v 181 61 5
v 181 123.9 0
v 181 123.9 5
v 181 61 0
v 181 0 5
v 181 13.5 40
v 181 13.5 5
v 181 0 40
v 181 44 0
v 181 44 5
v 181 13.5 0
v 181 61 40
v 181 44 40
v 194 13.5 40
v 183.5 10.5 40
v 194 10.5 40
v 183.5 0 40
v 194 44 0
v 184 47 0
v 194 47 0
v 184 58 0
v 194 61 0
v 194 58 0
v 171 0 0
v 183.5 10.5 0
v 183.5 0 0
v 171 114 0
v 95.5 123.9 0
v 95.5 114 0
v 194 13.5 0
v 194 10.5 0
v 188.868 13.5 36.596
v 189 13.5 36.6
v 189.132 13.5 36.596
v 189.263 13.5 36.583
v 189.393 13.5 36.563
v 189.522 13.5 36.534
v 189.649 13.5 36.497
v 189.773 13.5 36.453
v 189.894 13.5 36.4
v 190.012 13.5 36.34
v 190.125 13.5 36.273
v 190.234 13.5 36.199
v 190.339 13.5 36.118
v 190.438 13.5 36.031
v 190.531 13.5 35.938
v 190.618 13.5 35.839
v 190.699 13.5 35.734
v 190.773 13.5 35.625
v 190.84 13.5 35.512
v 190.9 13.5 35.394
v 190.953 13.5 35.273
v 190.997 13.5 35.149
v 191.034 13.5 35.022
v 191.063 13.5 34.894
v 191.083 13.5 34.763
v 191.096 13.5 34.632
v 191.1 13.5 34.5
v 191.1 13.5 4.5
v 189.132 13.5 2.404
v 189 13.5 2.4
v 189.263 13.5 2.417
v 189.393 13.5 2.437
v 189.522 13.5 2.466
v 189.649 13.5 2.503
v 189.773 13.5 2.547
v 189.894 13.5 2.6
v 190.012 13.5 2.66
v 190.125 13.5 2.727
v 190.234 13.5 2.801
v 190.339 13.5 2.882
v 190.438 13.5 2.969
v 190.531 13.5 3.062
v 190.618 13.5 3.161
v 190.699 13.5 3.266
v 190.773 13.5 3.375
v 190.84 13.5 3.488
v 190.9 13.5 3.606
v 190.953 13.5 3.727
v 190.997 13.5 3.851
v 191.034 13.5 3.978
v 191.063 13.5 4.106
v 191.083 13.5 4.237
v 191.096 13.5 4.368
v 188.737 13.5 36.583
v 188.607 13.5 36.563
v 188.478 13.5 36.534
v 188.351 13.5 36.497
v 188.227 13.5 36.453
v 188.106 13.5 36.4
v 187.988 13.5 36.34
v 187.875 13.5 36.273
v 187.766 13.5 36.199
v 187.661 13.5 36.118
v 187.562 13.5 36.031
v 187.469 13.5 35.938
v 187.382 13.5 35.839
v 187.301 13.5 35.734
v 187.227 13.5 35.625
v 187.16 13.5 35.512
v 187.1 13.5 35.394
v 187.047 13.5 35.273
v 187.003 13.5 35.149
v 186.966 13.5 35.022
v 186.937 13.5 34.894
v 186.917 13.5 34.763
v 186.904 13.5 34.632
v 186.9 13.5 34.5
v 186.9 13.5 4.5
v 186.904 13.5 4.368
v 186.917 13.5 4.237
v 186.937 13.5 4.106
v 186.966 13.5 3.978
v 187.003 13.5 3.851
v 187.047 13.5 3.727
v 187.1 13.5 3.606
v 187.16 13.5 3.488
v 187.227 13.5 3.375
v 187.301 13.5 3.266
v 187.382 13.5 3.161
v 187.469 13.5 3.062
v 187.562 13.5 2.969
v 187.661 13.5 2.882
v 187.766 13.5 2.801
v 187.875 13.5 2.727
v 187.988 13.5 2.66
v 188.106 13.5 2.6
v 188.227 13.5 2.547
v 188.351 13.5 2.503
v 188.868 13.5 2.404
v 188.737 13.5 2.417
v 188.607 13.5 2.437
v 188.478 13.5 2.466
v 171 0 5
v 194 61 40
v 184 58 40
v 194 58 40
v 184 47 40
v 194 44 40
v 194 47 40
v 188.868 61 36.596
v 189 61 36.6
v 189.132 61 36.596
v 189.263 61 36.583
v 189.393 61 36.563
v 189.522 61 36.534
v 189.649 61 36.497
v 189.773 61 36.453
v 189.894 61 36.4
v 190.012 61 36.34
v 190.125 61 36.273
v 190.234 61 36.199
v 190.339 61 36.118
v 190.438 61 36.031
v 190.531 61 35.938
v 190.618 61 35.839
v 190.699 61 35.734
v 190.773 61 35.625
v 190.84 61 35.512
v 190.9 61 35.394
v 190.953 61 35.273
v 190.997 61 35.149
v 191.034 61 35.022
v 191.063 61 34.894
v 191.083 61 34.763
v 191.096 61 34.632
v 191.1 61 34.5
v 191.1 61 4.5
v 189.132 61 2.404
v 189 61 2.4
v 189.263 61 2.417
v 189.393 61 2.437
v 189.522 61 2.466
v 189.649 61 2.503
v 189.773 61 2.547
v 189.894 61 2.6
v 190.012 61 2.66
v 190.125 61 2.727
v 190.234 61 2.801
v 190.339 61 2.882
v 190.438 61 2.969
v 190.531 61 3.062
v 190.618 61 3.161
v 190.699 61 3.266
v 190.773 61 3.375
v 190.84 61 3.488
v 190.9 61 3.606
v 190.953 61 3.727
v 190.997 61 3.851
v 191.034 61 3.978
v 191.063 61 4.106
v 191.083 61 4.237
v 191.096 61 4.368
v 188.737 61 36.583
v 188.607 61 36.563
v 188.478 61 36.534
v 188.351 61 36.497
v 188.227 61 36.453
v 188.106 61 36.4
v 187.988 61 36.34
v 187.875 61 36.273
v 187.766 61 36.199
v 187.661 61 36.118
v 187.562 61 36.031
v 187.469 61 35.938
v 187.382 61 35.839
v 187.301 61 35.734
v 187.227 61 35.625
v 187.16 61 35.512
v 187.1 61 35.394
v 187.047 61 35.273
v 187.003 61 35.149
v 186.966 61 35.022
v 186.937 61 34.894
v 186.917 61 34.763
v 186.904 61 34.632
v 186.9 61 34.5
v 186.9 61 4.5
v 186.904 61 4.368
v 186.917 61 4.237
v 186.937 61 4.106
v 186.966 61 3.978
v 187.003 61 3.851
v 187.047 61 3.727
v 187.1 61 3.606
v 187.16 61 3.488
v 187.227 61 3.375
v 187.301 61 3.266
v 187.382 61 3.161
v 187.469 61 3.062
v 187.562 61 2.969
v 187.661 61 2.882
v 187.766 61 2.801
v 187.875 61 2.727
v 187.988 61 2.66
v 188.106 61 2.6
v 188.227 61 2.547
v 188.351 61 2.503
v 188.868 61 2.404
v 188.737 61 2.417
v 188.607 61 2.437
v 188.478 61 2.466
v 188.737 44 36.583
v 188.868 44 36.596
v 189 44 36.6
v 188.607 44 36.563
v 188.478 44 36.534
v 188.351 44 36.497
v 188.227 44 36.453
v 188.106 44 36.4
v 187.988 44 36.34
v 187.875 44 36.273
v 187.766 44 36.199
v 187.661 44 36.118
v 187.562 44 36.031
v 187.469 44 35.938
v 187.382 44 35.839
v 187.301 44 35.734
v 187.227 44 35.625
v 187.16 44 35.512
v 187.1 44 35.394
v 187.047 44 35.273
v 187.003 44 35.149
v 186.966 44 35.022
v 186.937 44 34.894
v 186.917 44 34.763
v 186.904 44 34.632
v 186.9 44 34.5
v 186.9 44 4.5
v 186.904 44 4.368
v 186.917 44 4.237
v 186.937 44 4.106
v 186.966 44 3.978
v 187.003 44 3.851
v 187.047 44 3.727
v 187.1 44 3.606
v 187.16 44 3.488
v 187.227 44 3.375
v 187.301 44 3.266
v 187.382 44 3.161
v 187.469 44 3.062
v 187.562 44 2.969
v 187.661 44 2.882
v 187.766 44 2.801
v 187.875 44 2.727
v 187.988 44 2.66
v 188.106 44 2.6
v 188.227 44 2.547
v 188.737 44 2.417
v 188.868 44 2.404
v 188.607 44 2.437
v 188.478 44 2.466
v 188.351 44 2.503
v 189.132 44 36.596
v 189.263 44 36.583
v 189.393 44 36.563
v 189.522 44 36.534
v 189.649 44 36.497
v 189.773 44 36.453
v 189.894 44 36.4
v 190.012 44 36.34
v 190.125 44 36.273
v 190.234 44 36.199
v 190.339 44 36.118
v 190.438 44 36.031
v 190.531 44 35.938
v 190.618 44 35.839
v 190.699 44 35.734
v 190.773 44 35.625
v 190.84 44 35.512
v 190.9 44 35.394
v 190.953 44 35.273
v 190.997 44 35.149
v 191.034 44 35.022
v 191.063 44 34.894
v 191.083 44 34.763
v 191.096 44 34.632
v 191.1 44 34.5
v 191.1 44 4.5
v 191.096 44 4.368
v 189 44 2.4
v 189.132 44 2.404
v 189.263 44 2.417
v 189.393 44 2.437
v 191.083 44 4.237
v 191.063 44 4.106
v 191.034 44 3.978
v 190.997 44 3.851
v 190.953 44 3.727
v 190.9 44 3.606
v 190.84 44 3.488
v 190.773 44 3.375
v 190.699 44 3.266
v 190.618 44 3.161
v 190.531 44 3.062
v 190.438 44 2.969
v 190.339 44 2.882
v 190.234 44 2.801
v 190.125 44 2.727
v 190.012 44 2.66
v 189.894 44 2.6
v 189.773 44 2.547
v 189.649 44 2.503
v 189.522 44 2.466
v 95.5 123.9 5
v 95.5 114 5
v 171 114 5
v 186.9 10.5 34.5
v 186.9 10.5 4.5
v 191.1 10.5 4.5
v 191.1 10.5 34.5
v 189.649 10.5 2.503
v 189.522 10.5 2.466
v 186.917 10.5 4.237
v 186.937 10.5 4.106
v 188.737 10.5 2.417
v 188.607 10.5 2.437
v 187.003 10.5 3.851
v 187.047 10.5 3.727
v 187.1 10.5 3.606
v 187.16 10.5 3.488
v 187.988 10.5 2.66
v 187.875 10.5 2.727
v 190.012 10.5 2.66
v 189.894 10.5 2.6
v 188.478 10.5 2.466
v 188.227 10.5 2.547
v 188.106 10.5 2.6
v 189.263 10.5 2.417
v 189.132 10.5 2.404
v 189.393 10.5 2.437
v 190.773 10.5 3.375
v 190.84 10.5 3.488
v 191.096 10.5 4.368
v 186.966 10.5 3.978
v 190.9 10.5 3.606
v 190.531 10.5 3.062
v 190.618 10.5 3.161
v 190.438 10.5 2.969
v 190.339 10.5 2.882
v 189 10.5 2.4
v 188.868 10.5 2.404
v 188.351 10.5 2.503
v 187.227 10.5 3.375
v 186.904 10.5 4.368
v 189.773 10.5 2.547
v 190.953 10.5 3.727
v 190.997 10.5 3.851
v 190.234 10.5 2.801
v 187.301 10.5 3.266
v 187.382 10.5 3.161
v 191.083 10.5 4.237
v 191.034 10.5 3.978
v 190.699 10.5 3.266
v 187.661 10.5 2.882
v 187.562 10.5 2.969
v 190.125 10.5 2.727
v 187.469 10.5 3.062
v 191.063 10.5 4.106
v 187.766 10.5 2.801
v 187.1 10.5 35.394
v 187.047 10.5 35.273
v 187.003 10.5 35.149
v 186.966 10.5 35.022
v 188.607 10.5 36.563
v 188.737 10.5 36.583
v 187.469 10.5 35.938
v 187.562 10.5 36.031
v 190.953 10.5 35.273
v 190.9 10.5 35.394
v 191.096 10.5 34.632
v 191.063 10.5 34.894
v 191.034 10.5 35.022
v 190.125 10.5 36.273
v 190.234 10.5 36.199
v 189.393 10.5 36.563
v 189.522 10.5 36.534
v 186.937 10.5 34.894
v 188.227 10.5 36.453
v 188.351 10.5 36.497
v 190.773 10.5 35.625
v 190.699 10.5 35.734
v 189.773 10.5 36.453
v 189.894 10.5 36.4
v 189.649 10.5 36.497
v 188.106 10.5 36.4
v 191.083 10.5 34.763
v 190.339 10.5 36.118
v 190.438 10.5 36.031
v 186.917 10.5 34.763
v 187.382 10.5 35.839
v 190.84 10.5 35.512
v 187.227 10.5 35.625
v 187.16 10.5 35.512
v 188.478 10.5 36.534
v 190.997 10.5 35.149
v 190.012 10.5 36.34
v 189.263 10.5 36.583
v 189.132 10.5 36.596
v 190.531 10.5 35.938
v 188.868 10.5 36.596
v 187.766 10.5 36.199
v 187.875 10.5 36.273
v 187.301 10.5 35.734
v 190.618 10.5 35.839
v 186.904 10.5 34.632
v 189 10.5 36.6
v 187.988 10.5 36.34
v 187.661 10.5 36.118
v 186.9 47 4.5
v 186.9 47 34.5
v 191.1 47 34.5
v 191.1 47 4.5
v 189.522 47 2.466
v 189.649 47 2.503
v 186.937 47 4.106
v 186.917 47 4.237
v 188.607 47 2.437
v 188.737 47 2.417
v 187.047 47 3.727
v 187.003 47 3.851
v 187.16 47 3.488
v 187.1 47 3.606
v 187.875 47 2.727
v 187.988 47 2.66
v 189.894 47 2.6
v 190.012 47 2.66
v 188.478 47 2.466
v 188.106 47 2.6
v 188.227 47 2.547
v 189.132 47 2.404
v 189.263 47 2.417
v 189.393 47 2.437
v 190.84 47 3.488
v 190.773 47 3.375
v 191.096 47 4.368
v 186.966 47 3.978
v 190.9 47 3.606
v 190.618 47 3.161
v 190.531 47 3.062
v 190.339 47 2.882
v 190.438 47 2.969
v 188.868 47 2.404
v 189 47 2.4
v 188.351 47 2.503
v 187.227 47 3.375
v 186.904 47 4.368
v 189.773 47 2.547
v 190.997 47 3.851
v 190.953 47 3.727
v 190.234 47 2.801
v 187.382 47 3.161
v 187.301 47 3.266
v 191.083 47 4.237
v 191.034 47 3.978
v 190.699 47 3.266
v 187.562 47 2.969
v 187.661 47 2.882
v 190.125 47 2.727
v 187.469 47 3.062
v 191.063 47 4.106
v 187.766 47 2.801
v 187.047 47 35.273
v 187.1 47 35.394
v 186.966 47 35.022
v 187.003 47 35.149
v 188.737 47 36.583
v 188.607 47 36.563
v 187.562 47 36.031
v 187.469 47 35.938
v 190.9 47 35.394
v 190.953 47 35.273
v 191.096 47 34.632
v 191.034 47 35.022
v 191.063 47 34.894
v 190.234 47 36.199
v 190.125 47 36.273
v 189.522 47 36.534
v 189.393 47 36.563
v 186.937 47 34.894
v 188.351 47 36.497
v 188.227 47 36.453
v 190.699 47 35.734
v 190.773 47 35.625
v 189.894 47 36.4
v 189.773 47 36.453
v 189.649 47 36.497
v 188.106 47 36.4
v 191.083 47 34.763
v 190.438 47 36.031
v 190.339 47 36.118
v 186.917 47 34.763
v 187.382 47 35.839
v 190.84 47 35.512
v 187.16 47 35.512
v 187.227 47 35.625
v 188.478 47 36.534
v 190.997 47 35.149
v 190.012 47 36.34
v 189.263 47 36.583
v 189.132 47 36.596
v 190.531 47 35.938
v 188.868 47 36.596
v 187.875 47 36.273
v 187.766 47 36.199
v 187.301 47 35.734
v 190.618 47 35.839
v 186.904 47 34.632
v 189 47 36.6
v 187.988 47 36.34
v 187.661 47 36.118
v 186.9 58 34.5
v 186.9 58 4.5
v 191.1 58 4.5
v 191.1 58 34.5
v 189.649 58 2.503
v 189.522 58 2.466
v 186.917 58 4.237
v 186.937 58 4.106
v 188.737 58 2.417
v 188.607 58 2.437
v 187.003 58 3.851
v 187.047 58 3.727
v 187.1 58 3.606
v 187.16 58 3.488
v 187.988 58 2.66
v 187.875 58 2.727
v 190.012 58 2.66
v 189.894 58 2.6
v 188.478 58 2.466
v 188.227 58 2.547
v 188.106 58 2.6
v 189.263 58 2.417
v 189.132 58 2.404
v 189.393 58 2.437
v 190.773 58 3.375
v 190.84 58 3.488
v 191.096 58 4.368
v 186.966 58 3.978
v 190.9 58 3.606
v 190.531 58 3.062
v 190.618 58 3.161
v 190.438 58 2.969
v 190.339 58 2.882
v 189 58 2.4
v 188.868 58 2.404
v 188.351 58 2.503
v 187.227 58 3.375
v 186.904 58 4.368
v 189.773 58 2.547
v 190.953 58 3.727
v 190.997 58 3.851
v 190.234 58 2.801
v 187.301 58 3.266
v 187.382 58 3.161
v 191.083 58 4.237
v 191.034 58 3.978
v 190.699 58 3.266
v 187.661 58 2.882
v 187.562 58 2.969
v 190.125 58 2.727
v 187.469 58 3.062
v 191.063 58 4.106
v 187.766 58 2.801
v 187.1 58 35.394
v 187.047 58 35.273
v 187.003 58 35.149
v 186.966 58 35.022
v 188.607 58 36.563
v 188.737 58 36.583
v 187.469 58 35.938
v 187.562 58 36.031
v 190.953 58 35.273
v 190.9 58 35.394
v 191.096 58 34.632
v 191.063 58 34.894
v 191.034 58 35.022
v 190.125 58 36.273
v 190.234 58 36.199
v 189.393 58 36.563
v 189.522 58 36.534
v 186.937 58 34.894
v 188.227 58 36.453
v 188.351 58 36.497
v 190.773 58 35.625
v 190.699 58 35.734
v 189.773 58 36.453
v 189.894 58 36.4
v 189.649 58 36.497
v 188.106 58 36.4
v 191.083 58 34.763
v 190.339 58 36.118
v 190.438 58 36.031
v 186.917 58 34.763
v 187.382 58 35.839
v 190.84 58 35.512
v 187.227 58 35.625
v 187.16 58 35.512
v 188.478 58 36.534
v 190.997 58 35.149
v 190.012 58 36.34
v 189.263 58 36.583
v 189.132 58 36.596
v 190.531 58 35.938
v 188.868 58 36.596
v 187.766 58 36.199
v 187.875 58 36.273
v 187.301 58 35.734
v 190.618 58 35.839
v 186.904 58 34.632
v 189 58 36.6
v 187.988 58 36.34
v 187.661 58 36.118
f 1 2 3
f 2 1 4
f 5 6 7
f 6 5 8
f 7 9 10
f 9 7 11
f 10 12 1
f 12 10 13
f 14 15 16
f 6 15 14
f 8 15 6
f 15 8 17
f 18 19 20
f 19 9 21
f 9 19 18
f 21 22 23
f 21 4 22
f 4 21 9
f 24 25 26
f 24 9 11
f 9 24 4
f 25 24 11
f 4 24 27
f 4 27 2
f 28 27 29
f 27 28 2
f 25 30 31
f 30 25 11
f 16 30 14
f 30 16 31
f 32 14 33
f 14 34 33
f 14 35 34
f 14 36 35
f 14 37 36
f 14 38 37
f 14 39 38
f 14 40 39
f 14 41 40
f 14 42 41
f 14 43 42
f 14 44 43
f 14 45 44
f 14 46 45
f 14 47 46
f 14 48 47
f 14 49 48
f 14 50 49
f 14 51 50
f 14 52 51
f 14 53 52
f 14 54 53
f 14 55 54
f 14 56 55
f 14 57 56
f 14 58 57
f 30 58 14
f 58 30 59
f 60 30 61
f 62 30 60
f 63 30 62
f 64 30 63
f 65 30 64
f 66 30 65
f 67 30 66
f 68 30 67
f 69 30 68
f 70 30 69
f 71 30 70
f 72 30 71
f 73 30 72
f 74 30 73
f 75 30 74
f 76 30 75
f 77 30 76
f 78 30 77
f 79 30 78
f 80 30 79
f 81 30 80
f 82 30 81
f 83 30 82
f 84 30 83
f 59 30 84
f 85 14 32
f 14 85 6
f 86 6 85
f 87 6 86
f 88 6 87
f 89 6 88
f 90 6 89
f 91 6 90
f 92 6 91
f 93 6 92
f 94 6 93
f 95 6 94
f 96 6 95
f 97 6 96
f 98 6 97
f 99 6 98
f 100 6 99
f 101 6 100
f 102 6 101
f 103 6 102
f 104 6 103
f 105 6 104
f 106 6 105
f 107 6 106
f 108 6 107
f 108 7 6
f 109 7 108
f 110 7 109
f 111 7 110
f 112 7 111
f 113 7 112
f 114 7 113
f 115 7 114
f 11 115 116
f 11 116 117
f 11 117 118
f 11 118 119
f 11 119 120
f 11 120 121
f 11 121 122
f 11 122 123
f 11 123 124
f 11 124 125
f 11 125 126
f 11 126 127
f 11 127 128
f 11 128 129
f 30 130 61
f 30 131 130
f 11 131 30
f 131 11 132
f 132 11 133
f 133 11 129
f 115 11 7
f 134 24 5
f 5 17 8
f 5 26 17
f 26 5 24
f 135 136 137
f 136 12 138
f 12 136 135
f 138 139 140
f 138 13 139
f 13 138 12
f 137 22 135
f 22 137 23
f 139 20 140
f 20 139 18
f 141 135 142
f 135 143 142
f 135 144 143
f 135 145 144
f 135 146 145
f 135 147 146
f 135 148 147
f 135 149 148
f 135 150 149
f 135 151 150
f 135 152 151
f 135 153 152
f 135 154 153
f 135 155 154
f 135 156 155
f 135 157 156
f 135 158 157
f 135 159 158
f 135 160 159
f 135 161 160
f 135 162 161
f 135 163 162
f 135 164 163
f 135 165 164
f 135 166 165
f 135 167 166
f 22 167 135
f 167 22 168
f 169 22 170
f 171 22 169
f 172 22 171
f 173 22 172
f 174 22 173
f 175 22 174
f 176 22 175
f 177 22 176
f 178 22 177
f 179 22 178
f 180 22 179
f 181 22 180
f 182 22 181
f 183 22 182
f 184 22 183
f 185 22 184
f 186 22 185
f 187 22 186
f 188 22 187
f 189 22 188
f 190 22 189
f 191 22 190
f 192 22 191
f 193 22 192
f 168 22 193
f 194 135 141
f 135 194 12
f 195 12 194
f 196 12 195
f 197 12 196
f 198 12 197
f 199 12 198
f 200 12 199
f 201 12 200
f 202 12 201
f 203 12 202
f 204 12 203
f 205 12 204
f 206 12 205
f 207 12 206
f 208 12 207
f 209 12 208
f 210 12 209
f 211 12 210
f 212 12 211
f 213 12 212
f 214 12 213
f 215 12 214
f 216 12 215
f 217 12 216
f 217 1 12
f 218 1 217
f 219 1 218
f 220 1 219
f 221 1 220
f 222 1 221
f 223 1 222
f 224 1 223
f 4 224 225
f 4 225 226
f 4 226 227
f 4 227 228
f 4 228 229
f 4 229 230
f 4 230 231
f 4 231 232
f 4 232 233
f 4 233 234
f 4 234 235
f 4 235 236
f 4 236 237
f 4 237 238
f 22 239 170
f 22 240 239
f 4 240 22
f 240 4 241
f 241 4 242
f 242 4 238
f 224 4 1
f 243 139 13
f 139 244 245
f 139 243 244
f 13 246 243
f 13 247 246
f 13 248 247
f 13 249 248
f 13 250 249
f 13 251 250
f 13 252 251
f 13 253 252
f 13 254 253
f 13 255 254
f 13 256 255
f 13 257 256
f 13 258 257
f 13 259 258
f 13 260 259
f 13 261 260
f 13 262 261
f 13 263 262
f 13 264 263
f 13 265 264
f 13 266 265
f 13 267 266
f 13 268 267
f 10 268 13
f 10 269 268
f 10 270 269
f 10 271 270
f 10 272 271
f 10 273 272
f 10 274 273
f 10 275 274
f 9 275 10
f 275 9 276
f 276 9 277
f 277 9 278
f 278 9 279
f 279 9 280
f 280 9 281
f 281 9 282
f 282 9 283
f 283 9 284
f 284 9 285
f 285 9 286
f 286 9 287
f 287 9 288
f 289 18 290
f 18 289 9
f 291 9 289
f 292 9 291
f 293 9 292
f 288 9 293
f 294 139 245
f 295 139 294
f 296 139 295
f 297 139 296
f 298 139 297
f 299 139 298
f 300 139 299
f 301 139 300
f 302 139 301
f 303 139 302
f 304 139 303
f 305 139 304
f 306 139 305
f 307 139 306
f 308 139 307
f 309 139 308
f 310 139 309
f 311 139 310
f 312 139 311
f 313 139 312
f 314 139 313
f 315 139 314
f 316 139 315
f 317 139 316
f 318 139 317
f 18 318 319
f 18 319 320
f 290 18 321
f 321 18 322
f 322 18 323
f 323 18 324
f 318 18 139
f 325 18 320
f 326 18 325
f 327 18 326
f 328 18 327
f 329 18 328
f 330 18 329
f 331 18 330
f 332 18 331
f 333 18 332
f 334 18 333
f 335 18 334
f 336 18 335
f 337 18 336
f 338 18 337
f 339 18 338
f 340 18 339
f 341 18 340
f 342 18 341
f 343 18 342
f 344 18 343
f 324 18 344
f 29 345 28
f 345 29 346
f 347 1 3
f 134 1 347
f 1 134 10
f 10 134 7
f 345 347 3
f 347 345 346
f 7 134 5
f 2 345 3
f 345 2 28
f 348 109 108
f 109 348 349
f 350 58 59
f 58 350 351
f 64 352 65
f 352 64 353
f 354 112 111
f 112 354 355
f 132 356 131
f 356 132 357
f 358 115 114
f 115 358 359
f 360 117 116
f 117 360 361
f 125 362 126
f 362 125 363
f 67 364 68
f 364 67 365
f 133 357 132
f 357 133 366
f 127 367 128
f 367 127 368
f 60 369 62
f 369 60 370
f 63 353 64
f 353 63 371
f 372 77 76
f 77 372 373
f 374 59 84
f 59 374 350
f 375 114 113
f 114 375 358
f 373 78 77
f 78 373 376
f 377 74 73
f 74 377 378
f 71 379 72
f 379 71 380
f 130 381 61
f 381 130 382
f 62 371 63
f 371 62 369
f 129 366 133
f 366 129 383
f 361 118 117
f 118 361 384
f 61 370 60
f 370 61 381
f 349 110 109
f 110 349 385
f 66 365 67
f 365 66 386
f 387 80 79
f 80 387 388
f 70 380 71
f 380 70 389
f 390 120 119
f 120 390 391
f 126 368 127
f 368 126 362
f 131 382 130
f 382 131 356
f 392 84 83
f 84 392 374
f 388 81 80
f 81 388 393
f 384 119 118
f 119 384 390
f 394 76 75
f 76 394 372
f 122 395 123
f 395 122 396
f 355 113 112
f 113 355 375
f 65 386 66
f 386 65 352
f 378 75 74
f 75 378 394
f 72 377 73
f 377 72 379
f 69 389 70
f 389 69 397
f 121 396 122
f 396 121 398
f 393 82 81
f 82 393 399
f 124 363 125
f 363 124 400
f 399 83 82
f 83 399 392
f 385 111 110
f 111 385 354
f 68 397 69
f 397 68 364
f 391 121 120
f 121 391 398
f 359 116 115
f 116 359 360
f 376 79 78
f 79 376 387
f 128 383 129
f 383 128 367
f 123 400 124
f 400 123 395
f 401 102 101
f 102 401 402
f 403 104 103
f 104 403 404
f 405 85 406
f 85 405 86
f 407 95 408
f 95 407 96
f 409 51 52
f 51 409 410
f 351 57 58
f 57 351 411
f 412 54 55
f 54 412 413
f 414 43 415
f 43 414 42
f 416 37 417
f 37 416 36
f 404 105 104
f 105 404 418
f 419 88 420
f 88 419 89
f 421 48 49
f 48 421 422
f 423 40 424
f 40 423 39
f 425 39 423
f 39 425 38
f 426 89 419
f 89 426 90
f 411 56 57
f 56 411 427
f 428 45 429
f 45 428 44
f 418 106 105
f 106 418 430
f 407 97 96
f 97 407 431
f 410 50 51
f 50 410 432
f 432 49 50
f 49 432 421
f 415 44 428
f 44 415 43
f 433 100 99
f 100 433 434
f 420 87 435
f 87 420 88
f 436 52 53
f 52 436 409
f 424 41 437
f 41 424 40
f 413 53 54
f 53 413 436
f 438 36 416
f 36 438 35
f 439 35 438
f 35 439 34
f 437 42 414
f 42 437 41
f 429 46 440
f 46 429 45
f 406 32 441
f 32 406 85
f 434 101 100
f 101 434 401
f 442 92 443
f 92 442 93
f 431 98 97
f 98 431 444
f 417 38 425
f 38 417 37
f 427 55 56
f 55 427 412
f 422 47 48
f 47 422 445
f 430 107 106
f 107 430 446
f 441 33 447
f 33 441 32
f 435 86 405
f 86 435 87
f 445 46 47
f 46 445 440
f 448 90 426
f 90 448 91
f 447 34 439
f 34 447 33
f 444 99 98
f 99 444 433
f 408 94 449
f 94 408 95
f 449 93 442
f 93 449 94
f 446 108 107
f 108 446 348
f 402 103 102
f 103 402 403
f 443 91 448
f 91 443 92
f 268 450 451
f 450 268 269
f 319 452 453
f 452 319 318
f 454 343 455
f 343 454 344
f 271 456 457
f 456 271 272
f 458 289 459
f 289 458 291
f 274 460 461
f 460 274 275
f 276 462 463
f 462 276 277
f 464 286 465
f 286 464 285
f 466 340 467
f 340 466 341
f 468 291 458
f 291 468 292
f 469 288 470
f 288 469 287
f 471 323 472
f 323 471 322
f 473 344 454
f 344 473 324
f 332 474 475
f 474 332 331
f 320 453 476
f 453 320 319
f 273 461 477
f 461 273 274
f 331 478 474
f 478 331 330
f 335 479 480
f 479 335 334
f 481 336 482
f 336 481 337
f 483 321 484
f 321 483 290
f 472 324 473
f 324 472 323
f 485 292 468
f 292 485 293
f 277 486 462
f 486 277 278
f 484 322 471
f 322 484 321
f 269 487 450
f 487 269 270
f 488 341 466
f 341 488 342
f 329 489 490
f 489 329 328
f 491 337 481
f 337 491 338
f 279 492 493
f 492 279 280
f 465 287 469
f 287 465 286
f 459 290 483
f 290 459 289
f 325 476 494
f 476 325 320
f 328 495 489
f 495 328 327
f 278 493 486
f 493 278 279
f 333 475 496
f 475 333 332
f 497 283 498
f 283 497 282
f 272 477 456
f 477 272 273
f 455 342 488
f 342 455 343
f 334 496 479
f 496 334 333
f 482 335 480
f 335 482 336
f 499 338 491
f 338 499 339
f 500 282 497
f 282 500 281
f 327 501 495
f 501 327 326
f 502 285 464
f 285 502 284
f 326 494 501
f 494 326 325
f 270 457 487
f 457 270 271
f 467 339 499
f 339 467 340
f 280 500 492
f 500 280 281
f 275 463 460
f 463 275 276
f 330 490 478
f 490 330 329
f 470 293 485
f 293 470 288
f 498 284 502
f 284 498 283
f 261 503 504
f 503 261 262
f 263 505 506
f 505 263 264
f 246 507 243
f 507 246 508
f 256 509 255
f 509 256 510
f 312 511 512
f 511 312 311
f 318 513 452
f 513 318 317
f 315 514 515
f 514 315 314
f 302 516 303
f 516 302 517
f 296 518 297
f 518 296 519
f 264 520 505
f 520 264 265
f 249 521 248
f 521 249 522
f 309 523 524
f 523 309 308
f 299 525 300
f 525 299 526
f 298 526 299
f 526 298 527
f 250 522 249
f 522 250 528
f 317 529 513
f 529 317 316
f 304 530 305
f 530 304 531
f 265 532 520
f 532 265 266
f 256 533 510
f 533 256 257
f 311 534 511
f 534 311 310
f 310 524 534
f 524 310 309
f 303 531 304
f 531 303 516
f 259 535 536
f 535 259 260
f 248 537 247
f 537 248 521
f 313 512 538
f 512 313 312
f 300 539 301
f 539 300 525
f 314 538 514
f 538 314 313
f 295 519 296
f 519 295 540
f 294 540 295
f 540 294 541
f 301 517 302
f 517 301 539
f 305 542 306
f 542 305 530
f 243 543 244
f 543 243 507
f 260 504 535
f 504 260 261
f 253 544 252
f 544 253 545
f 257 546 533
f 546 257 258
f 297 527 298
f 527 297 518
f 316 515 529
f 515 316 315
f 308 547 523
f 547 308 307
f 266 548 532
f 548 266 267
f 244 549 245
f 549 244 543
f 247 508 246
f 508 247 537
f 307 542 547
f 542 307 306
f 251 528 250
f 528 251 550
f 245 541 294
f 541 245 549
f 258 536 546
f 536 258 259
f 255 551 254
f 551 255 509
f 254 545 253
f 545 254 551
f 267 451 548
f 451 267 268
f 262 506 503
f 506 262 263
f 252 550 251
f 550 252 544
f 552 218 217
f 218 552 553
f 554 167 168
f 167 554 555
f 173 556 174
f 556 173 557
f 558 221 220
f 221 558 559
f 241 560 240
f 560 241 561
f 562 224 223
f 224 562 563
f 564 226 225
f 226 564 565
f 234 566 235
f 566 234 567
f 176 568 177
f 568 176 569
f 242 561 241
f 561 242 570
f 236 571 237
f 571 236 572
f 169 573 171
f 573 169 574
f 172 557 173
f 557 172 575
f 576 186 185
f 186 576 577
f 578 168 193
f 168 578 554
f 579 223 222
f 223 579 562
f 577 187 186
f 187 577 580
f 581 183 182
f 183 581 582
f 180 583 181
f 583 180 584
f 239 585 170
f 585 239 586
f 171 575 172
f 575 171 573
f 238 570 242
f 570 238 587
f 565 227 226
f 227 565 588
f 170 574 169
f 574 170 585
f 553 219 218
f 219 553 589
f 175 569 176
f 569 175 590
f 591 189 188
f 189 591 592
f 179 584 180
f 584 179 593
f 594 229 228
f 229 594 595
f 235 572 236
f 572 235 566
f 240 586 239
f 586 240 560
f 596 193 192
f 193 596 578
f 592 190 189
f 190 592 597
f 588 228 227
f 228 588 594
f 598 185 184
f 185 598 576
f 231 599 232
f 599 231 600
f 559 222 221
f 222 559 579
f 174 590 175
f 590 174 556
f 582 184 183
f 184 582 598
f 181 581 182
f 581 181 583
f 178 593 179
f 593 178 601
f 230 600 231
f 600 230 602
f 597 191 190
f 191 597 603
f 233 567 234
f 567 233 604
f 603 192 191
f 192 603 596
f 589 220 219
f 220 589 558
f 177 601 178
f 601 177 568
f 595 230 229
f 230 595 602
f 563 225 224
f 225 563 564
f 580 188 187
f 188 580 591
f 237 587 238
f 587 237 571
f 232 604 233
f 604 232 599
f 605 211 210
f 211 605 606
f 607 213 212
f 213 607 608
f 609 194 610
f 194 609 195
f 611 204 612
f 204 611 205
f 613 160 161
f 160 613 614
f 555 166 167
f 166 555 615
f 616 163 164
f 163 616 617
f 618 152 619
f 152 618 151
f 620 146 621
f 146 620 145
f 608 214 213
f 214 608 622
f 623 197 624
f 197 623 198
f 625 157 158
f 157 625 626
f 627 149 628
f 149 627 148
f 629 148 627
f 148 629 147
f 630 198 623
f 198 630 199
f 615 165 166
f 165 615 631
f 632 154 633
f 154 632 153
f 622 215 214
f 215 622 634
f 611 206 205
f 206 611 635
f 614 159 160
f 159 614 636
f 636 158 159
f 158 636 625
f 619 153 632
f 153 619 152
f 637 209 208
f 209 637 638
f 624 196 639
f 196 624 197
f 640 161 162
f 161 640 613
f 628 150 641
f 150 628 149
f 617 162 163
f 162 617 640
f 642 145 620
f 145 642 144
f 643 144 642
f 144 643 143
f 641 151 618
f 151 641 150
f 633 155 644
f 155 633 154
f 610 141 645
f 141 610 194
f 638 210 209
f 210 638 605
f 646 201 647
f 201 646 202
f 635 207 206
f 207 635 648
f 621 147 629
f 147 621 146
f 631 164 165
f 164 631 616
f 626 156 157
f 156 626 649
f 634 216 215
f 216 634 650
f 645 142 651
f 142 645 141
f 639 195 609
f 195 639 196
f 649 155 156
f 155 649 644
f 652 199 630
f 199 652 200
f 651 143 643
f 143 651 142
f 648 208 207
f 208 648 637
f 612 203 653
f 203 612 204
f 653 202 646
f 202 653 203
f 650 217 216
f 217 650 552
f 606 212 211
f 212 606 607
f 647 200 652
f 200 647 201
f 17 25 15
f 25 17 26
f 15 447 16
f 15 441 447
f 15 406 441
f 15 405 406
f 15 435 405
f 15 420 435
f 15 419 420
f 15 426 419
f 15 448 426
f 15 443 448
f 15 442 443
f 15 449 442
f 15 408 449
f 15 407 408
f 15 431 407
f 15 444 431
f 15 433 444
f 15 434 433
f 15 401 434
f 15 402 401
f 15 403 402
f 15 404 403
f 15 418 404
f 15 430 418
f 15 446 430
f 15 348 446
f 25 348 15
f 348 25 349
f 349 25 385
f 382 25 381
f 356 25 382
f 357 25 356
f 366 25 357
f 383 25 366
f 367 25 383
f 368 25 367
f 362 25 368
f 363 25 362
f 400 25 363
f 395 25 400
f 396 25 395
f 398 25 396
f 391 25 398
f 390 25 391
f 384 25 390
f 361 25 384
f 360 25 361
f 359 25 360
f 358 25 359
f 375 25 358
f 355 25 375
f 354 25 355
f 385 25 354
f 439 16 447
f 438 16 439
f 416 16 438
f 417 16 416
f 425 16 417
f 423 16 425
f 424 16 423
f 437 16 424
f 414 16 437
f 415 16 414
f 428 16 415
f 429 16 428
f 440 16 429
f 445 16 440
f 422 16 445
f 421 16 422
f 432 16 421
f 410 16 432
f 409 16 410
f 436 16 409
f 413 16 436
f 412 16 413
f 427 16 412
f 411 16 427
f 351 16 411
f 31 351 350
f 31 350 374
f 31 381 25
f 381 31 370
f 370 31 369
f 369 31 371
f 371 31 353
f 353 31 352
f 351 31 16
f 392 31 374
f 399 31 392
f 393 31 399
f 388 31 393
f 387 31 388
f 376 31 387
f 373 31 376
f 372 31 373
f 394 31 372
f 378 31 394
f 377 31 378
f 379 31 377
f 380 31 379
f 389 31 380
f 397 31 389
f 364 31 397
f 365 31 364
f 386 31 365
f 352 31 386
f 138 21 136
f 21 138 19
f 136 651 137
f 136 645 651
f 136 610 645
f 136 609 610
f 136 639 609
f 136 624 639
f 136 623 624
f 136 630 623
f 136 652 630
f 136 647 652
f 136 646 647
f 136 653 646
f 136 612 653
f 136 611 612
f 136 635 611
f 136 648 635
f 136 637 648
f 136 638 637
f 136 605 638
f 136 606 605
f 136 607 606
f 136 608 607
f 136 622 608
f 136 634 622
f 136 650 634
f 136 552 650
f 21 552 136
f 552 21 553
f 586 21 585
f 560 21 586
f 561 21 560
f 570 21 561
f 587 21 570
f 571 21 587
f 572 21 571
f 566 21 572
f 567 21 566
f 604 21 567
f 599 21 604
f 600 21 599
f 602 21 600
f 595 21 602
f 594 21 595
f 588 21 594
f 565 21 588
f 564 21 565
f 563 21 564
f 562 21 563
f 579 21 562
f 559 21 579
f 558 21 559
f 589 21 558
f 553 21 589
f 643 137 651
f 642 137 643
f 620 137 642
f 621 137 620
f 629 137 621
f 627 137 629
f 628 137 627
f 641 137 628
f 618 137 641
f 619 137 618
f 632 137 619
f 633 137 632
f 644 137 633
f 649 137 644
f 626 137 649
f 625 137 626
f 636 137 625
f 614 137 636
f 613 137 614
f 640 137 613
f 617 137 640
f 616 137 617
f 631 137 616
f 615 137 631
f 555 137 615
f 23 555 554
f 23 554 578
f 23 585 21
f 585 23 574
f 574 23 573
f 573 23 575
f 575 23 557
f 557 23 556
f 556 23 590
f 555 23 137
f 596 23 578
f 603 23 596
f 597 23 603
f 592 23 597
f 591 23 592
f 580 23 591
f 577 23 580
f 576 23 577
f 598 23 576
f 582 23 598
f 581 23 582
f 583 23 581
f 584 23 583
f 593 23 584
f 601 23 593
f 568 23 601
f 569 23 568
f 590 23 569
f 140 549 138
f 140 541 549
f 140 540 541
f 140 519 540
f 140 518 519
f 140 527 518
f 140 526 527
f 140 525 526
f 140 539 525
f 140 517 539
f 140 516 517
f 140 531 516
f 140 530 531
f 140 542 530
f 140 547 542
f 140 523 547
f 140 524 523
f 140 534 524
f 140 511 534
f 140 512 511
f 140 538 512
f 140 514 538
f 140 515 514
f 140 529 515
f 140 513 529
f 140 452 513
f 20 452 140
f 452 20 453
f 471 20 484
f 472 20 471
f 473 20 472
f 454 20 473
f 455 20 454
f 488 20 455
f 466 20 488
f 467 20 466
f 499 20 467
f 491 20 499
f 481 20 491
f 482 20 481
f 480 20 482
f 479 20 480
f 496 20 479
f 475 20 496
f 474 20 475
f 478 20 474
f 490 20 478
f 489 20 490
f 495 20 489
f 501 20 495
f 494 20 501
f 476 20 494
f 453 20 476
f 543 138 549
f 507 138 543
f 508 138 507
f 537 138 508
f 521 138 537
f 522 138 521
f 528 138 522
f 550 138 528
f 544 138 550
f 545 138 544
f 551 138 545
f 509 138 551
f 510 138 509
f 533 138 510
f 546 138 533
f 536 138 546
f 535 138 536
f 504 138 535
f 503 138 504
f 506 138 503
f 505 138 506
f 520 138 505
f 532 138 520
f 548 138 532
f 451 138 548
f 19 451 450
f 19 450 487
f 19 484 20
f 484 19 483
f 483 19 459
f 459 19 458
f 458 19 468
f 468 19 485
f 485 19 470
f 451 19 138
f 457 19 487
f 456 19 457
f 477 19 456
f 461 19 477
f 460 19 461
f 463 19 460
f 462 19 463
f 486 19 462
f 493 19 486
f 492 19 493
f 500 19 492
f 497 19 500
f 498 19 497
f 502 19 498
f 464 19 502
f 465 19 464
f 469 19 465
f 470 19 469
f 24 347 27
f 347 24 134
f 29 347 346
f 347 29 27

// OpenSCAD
$fn=100;

module rail(L) {
	rotate([0,-90,-180]) {
	translate([0,0,0.4])cube([4,L,4.2]);
	translate([0,0,2.5])rotate([0,90,0])cylinder(d=4.2, h=4);
	translate([0,L,2.5])rotate([0,90,0])cylinder(d=4.2, h=4);
	}
}

largeur_Barre = 10;
longueur_Barre = 200;
module fixation_coque_Barre() {
	cube([largeur_Barre,largeur_Barre,longueur_Barre]); 
}

module fixations_coque() {
	translate([3,127,5]) fixation_coque_Barre();
	translate([187,127,5]) fixation_coque_Barre(); 
	translate([60,3,5]) fixation_coque_Barre();
	translate([130,3,5]) fixation_coque_Barre();
	translate([3,80,5])fixation_coque_Barre();
	translate([187,80,5]) fixation_coque_Barre();
}

module fixation_toit_1(){
	difference(){
		union(){
			cube([13,13.5,40]);
			//translate([181,0,0])cube([13,13.5,40]);
			translate([0,44,0])cube([13,17,40]);
			//translate([181,44,0])cube([13,17,40]);
			translate([13,0,0])cube([171/2,123.9,5]);
		}
		cube([10.5,10.5,40]);
		translate([184,0,0])cube([10.5,10.5,40]);
		translate([0,47,0])cube([10,11,40]);
		translate([184,47,0])cube([10,11,40]);


		translate([23,0,0])cube([151,114,5]);
		translate([2.5,9.6,4.5])rotate([-90,0,0])rail(30);
		translate([2.5,43.6,4.5])rotate([-90,0,0])rail(30);
		translate([2.5,57.5,4.5])rotate([-90,0,0])#rail(30);

		translate([186,9.6,4.5])rotate([-90,0,0])#rail(30);
		translate([186.5,43.6,4.5])rotate([-90,0,0])#rail(30);
		translate([186.5,57.5,4.5])rotate([-90,0,0])#rail(30);
	}
}

module fixation_toit_2(){
	mirror([0,1,0])translate([194,0,0])rotate([0,0,180])fixation_toit_1();
}

//fixation_toit_1();
fixation_toit_2();
